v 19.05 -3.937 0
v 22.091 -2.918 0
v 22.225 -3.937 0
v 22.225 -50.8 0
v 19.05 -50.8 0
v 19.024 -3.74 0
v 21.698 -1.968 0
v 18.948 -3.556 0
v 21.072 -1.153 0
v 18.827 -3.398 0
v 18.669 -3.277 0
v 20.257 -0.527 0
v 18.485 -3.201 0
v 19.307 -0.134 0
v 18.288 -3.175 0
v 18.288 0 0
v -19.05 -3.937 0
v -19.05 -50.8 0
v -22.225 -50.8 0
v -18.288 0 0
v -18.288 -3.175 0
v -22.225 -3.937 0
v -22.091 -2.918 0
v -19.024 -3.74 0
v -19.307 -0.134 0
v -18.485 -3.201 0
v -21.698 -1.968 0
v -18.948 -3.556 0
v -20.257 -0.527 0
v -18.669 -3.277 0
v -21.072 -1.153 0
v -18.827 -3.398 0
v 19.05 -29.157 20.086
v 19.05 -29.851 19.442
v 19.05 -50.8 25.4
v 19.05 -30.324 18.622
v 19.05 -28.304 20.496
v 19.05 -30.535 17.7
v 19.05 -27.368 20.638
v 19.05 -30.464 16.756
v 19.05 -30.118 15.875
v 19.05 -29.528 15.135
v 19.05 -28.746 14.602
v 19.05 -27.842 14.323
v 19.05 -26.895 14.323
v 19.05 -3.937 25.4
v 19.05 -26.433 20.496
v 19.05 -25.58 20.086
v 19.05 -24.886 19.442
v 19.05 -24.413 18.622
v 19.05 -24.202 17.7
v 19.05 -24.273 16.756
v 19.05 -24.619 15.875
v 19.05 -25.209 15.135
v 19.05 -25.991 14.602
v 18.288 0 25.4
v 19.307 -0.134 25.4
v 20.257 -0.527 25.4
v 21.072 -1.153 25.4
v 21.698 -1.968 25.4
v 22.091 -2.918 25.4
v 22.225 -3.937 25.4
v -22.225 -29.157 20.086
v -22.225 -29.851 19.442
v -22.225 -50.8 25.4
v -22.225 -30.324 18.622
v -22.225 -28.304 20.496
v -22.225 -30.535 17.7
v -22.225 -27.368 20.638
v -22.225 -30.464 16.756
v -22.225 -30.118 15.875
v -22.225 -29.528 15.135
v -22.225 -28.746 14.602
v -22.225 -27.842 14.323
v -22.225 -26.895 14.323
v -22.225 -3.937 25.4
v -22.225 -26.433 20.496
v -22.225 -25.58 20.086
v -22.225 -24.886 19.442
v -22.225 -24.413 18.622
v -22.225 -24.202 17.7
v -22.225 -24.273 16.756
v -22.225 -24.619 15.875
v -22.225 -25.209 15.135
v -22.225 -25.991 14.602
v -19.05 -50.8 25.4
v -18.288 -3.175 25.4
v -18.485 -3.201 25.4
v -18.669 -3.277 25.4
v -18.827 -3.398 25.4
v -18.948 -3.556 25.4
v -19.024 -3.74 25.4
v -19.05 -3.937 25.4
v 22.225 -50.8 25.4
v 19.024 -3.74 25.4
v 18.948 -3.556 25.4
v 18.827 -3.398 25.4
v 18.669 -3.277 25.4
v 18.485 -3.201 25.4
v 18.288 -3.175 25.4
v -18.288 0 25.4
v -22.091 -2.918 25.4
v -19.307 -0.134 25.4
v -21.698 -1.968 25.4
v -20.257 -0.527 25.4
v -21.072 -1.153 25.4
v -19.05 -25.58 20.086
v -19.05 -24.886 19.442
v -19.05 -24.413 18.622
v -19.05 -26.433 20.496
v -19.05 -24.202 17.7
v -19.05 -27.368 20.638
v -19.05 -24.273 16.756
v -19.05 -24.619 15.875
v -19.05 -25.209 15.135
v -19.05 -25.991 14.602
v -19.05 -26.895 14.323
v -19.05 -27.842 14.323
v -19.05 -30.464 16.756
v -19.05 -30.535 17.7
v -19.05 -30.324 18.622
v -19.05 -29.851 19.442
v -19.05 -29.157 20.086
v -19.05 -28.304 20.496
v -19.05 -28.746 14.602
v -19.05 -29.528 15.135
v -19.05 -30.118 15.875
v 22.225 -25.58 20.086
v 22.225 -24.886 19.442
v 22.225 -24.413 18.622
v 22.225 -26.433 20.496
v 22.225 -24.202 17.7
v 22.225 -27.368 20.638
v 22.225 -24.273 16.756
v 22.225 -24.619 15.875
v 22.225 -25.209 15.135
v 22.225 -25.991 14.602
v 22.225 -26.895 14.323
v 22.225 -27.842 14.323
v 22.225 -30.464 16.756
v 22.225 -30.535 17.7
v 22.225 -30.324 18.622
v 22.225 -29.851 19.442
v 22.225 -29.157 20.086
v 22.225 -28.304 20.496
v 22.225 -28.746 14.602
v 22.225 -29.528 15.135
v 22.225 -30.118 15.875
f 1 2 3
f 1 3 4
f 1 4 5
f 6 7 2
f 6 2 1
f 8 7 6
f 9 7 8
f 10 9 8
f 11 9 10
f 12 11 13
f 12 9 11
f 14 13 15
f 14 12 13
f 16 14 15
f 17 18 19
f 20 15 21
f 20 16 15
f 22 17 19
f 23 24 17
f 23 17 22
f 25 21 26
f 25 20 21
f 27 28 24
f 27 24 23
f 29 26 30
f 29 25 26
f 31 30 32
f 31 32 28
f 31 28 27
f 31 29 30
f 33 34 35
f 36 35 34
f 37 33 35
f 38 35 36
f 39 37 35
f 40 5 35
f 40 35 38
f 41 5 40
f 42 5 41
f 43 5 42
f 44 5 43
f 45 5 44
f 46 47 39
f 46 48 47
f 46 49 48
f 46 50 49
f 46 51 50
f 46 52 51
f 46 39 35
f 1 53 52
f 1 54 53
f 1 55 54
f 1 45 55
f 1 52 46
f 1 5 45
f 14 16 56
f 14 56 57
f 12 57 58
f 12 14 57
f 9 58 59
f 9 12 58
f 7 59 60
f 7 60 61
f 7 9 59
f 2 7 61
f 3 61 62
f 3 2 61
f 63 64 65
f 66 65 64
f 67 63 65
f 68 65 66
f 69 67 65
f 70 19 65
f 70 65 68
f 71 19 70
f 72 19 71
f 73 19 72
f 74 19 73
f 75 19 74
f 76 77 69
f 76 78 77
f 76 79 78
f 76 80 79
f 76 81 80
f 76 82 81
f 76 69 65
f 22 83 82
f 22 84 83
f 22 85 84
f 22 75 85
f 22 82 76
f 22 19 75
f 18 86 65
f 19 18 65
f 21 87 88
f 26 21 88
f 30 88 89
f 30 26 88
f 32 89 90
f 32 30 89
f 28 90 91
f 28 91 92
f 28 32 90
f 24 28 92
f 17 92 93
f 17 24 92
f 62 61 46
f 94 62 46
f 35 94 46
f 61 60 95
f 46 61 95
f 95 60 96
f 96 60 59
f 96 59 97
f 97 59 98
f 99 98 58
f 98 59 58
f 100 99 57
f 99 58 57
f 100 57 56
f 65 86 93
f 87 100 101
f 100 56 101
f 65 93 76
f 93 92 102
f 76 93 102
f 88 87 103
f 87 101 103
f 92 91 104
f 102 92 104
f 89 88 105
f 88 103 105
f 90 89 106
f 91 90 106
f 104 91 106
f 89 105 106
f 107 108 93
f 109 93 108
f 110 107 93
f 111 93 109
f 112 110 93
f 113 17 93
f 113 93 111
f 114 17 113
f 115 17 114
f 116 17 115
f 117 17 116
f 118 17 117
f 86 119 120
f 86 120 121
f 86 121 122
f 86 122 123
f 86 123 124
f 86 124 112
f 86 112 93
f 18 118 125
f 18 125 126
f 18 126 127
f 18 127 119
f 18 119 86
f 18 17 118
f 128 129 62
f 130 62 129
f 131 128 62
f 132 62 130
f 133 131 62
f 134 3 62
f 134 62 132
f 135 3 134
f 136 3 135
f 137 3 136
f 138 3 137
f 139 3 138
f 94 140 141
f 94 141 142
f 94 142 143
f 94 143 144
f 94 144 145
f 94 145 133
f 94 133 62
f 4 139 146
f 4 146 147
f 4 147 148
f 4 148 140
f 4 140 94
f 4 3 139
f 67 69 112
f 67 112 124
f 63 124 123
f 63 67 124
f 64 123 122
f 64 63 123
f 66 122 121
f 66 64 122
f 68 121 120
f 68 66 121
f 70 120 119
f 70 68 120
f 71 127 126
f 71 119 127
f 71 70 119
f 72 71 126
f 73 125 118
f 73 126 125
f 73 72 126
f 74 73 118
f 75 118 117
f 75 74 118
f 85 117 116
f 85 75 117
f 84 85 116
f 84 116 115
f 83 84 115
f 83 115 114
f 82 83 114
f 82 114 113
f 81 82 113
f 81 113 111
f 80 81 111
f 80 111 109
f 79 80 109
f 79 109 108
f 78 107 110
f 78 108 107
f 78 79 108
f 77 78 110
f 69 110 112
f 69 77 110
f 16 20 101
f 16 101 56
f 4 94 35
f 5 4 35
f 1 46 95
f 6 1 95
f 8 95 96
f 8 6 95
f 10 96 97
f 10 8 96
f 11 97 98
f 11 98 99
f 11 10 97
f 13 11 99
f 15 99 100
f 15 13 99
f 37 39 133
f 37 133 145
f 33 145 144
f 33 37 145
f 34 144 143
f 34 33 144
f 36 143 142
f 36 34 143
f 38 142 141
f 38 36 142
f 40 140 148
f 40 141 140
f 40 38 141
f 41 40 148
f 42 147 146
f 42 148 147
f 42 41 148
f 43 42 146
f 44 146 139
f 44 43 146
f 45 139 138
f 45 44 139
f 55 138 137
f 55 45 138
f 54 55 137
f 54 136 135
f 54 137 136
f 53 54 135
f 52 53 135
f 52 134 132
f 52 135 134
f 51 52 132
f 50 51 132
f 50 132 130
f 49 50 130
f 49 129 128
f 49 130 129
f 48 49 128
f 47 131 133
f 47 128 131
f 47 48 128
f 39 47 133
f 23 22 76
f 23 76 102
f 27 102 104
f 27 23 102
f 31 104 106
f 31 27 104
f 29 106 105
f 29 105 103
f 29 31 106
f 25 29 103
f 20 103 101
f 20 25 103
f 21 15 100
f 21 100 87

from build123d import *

# Parameters (mm, degrees)
BASE_FLANGE2_DEPTH      = 25.4
CUT_EXTRUDE1_DEPTH      = 61.989758362
CUT_EXTRUDE1_DEPTH_BACK = 61.989758362
SKETCH10_R              = 3.175


# Sheet-metal steps are written as plain solids
with BuildPart() as part:
    # Sketch1 → Base-Flange2 (new body)
    with BuildSketch(Plane.XY):
        with BuildLine():
            Line((-22.225, -50.8), (-22.225, -3.937))
            ThreePointArc((-22.225, -3.937), (-21.071879398, -1.153120602), (-18.288, 0))
            Line((-18.288, 0), (18.288, 0))
            ThreePointArc((18.288, 0), (21.071879398, -1.153120602), (22.225, -3.937))
            Line((22.225, -3.937), (22.225, -50.8))
            Line((22.225, -50.8), (19.05, -50.8))
            Line((19.05, -50.8), (19.05, -3.937))
            ThreePointArc((19.05, -3.937), (18.826815367, -3.398184633), (18.288, -3.175))
            Line((18.288, -3.175), (-18.288, -3.175))
            ThreePointArc((-18.288, -3.175), (-18.826815367, -3.398184633), (-19.05, -3.937))
            Line((-19.05, -3.937), (-19.05, -50.8))
            Line((-19.05, -50.8), (-22.225, -50.8))
        make_face()
    extrude(amount=BASE_FLANGE2_DEPTH)

    # Sketch10 → Cut-Extrude1 (cut, two sides: drawn at the far end of the back side and taken through both)
    with BuildSketch(Plane(origin=(0, 0, 0), x_dir=(0, 0, -1), z_dir=(1, 0, 0)).offset(-CUT_EXTRUDE1_DEPTH_BACK)):
        with Locations(Location((-17.4625, -27.3685, 0), (0, 0, 180))):
            Circle(SKETCH10_R)
    extrude(amount=CUT_EXTRUDE1_DEPTH + CUT_EXTRUDE1_DEPTH_BACK, mode=Mode.SUBTRACT)


solid = part.part
